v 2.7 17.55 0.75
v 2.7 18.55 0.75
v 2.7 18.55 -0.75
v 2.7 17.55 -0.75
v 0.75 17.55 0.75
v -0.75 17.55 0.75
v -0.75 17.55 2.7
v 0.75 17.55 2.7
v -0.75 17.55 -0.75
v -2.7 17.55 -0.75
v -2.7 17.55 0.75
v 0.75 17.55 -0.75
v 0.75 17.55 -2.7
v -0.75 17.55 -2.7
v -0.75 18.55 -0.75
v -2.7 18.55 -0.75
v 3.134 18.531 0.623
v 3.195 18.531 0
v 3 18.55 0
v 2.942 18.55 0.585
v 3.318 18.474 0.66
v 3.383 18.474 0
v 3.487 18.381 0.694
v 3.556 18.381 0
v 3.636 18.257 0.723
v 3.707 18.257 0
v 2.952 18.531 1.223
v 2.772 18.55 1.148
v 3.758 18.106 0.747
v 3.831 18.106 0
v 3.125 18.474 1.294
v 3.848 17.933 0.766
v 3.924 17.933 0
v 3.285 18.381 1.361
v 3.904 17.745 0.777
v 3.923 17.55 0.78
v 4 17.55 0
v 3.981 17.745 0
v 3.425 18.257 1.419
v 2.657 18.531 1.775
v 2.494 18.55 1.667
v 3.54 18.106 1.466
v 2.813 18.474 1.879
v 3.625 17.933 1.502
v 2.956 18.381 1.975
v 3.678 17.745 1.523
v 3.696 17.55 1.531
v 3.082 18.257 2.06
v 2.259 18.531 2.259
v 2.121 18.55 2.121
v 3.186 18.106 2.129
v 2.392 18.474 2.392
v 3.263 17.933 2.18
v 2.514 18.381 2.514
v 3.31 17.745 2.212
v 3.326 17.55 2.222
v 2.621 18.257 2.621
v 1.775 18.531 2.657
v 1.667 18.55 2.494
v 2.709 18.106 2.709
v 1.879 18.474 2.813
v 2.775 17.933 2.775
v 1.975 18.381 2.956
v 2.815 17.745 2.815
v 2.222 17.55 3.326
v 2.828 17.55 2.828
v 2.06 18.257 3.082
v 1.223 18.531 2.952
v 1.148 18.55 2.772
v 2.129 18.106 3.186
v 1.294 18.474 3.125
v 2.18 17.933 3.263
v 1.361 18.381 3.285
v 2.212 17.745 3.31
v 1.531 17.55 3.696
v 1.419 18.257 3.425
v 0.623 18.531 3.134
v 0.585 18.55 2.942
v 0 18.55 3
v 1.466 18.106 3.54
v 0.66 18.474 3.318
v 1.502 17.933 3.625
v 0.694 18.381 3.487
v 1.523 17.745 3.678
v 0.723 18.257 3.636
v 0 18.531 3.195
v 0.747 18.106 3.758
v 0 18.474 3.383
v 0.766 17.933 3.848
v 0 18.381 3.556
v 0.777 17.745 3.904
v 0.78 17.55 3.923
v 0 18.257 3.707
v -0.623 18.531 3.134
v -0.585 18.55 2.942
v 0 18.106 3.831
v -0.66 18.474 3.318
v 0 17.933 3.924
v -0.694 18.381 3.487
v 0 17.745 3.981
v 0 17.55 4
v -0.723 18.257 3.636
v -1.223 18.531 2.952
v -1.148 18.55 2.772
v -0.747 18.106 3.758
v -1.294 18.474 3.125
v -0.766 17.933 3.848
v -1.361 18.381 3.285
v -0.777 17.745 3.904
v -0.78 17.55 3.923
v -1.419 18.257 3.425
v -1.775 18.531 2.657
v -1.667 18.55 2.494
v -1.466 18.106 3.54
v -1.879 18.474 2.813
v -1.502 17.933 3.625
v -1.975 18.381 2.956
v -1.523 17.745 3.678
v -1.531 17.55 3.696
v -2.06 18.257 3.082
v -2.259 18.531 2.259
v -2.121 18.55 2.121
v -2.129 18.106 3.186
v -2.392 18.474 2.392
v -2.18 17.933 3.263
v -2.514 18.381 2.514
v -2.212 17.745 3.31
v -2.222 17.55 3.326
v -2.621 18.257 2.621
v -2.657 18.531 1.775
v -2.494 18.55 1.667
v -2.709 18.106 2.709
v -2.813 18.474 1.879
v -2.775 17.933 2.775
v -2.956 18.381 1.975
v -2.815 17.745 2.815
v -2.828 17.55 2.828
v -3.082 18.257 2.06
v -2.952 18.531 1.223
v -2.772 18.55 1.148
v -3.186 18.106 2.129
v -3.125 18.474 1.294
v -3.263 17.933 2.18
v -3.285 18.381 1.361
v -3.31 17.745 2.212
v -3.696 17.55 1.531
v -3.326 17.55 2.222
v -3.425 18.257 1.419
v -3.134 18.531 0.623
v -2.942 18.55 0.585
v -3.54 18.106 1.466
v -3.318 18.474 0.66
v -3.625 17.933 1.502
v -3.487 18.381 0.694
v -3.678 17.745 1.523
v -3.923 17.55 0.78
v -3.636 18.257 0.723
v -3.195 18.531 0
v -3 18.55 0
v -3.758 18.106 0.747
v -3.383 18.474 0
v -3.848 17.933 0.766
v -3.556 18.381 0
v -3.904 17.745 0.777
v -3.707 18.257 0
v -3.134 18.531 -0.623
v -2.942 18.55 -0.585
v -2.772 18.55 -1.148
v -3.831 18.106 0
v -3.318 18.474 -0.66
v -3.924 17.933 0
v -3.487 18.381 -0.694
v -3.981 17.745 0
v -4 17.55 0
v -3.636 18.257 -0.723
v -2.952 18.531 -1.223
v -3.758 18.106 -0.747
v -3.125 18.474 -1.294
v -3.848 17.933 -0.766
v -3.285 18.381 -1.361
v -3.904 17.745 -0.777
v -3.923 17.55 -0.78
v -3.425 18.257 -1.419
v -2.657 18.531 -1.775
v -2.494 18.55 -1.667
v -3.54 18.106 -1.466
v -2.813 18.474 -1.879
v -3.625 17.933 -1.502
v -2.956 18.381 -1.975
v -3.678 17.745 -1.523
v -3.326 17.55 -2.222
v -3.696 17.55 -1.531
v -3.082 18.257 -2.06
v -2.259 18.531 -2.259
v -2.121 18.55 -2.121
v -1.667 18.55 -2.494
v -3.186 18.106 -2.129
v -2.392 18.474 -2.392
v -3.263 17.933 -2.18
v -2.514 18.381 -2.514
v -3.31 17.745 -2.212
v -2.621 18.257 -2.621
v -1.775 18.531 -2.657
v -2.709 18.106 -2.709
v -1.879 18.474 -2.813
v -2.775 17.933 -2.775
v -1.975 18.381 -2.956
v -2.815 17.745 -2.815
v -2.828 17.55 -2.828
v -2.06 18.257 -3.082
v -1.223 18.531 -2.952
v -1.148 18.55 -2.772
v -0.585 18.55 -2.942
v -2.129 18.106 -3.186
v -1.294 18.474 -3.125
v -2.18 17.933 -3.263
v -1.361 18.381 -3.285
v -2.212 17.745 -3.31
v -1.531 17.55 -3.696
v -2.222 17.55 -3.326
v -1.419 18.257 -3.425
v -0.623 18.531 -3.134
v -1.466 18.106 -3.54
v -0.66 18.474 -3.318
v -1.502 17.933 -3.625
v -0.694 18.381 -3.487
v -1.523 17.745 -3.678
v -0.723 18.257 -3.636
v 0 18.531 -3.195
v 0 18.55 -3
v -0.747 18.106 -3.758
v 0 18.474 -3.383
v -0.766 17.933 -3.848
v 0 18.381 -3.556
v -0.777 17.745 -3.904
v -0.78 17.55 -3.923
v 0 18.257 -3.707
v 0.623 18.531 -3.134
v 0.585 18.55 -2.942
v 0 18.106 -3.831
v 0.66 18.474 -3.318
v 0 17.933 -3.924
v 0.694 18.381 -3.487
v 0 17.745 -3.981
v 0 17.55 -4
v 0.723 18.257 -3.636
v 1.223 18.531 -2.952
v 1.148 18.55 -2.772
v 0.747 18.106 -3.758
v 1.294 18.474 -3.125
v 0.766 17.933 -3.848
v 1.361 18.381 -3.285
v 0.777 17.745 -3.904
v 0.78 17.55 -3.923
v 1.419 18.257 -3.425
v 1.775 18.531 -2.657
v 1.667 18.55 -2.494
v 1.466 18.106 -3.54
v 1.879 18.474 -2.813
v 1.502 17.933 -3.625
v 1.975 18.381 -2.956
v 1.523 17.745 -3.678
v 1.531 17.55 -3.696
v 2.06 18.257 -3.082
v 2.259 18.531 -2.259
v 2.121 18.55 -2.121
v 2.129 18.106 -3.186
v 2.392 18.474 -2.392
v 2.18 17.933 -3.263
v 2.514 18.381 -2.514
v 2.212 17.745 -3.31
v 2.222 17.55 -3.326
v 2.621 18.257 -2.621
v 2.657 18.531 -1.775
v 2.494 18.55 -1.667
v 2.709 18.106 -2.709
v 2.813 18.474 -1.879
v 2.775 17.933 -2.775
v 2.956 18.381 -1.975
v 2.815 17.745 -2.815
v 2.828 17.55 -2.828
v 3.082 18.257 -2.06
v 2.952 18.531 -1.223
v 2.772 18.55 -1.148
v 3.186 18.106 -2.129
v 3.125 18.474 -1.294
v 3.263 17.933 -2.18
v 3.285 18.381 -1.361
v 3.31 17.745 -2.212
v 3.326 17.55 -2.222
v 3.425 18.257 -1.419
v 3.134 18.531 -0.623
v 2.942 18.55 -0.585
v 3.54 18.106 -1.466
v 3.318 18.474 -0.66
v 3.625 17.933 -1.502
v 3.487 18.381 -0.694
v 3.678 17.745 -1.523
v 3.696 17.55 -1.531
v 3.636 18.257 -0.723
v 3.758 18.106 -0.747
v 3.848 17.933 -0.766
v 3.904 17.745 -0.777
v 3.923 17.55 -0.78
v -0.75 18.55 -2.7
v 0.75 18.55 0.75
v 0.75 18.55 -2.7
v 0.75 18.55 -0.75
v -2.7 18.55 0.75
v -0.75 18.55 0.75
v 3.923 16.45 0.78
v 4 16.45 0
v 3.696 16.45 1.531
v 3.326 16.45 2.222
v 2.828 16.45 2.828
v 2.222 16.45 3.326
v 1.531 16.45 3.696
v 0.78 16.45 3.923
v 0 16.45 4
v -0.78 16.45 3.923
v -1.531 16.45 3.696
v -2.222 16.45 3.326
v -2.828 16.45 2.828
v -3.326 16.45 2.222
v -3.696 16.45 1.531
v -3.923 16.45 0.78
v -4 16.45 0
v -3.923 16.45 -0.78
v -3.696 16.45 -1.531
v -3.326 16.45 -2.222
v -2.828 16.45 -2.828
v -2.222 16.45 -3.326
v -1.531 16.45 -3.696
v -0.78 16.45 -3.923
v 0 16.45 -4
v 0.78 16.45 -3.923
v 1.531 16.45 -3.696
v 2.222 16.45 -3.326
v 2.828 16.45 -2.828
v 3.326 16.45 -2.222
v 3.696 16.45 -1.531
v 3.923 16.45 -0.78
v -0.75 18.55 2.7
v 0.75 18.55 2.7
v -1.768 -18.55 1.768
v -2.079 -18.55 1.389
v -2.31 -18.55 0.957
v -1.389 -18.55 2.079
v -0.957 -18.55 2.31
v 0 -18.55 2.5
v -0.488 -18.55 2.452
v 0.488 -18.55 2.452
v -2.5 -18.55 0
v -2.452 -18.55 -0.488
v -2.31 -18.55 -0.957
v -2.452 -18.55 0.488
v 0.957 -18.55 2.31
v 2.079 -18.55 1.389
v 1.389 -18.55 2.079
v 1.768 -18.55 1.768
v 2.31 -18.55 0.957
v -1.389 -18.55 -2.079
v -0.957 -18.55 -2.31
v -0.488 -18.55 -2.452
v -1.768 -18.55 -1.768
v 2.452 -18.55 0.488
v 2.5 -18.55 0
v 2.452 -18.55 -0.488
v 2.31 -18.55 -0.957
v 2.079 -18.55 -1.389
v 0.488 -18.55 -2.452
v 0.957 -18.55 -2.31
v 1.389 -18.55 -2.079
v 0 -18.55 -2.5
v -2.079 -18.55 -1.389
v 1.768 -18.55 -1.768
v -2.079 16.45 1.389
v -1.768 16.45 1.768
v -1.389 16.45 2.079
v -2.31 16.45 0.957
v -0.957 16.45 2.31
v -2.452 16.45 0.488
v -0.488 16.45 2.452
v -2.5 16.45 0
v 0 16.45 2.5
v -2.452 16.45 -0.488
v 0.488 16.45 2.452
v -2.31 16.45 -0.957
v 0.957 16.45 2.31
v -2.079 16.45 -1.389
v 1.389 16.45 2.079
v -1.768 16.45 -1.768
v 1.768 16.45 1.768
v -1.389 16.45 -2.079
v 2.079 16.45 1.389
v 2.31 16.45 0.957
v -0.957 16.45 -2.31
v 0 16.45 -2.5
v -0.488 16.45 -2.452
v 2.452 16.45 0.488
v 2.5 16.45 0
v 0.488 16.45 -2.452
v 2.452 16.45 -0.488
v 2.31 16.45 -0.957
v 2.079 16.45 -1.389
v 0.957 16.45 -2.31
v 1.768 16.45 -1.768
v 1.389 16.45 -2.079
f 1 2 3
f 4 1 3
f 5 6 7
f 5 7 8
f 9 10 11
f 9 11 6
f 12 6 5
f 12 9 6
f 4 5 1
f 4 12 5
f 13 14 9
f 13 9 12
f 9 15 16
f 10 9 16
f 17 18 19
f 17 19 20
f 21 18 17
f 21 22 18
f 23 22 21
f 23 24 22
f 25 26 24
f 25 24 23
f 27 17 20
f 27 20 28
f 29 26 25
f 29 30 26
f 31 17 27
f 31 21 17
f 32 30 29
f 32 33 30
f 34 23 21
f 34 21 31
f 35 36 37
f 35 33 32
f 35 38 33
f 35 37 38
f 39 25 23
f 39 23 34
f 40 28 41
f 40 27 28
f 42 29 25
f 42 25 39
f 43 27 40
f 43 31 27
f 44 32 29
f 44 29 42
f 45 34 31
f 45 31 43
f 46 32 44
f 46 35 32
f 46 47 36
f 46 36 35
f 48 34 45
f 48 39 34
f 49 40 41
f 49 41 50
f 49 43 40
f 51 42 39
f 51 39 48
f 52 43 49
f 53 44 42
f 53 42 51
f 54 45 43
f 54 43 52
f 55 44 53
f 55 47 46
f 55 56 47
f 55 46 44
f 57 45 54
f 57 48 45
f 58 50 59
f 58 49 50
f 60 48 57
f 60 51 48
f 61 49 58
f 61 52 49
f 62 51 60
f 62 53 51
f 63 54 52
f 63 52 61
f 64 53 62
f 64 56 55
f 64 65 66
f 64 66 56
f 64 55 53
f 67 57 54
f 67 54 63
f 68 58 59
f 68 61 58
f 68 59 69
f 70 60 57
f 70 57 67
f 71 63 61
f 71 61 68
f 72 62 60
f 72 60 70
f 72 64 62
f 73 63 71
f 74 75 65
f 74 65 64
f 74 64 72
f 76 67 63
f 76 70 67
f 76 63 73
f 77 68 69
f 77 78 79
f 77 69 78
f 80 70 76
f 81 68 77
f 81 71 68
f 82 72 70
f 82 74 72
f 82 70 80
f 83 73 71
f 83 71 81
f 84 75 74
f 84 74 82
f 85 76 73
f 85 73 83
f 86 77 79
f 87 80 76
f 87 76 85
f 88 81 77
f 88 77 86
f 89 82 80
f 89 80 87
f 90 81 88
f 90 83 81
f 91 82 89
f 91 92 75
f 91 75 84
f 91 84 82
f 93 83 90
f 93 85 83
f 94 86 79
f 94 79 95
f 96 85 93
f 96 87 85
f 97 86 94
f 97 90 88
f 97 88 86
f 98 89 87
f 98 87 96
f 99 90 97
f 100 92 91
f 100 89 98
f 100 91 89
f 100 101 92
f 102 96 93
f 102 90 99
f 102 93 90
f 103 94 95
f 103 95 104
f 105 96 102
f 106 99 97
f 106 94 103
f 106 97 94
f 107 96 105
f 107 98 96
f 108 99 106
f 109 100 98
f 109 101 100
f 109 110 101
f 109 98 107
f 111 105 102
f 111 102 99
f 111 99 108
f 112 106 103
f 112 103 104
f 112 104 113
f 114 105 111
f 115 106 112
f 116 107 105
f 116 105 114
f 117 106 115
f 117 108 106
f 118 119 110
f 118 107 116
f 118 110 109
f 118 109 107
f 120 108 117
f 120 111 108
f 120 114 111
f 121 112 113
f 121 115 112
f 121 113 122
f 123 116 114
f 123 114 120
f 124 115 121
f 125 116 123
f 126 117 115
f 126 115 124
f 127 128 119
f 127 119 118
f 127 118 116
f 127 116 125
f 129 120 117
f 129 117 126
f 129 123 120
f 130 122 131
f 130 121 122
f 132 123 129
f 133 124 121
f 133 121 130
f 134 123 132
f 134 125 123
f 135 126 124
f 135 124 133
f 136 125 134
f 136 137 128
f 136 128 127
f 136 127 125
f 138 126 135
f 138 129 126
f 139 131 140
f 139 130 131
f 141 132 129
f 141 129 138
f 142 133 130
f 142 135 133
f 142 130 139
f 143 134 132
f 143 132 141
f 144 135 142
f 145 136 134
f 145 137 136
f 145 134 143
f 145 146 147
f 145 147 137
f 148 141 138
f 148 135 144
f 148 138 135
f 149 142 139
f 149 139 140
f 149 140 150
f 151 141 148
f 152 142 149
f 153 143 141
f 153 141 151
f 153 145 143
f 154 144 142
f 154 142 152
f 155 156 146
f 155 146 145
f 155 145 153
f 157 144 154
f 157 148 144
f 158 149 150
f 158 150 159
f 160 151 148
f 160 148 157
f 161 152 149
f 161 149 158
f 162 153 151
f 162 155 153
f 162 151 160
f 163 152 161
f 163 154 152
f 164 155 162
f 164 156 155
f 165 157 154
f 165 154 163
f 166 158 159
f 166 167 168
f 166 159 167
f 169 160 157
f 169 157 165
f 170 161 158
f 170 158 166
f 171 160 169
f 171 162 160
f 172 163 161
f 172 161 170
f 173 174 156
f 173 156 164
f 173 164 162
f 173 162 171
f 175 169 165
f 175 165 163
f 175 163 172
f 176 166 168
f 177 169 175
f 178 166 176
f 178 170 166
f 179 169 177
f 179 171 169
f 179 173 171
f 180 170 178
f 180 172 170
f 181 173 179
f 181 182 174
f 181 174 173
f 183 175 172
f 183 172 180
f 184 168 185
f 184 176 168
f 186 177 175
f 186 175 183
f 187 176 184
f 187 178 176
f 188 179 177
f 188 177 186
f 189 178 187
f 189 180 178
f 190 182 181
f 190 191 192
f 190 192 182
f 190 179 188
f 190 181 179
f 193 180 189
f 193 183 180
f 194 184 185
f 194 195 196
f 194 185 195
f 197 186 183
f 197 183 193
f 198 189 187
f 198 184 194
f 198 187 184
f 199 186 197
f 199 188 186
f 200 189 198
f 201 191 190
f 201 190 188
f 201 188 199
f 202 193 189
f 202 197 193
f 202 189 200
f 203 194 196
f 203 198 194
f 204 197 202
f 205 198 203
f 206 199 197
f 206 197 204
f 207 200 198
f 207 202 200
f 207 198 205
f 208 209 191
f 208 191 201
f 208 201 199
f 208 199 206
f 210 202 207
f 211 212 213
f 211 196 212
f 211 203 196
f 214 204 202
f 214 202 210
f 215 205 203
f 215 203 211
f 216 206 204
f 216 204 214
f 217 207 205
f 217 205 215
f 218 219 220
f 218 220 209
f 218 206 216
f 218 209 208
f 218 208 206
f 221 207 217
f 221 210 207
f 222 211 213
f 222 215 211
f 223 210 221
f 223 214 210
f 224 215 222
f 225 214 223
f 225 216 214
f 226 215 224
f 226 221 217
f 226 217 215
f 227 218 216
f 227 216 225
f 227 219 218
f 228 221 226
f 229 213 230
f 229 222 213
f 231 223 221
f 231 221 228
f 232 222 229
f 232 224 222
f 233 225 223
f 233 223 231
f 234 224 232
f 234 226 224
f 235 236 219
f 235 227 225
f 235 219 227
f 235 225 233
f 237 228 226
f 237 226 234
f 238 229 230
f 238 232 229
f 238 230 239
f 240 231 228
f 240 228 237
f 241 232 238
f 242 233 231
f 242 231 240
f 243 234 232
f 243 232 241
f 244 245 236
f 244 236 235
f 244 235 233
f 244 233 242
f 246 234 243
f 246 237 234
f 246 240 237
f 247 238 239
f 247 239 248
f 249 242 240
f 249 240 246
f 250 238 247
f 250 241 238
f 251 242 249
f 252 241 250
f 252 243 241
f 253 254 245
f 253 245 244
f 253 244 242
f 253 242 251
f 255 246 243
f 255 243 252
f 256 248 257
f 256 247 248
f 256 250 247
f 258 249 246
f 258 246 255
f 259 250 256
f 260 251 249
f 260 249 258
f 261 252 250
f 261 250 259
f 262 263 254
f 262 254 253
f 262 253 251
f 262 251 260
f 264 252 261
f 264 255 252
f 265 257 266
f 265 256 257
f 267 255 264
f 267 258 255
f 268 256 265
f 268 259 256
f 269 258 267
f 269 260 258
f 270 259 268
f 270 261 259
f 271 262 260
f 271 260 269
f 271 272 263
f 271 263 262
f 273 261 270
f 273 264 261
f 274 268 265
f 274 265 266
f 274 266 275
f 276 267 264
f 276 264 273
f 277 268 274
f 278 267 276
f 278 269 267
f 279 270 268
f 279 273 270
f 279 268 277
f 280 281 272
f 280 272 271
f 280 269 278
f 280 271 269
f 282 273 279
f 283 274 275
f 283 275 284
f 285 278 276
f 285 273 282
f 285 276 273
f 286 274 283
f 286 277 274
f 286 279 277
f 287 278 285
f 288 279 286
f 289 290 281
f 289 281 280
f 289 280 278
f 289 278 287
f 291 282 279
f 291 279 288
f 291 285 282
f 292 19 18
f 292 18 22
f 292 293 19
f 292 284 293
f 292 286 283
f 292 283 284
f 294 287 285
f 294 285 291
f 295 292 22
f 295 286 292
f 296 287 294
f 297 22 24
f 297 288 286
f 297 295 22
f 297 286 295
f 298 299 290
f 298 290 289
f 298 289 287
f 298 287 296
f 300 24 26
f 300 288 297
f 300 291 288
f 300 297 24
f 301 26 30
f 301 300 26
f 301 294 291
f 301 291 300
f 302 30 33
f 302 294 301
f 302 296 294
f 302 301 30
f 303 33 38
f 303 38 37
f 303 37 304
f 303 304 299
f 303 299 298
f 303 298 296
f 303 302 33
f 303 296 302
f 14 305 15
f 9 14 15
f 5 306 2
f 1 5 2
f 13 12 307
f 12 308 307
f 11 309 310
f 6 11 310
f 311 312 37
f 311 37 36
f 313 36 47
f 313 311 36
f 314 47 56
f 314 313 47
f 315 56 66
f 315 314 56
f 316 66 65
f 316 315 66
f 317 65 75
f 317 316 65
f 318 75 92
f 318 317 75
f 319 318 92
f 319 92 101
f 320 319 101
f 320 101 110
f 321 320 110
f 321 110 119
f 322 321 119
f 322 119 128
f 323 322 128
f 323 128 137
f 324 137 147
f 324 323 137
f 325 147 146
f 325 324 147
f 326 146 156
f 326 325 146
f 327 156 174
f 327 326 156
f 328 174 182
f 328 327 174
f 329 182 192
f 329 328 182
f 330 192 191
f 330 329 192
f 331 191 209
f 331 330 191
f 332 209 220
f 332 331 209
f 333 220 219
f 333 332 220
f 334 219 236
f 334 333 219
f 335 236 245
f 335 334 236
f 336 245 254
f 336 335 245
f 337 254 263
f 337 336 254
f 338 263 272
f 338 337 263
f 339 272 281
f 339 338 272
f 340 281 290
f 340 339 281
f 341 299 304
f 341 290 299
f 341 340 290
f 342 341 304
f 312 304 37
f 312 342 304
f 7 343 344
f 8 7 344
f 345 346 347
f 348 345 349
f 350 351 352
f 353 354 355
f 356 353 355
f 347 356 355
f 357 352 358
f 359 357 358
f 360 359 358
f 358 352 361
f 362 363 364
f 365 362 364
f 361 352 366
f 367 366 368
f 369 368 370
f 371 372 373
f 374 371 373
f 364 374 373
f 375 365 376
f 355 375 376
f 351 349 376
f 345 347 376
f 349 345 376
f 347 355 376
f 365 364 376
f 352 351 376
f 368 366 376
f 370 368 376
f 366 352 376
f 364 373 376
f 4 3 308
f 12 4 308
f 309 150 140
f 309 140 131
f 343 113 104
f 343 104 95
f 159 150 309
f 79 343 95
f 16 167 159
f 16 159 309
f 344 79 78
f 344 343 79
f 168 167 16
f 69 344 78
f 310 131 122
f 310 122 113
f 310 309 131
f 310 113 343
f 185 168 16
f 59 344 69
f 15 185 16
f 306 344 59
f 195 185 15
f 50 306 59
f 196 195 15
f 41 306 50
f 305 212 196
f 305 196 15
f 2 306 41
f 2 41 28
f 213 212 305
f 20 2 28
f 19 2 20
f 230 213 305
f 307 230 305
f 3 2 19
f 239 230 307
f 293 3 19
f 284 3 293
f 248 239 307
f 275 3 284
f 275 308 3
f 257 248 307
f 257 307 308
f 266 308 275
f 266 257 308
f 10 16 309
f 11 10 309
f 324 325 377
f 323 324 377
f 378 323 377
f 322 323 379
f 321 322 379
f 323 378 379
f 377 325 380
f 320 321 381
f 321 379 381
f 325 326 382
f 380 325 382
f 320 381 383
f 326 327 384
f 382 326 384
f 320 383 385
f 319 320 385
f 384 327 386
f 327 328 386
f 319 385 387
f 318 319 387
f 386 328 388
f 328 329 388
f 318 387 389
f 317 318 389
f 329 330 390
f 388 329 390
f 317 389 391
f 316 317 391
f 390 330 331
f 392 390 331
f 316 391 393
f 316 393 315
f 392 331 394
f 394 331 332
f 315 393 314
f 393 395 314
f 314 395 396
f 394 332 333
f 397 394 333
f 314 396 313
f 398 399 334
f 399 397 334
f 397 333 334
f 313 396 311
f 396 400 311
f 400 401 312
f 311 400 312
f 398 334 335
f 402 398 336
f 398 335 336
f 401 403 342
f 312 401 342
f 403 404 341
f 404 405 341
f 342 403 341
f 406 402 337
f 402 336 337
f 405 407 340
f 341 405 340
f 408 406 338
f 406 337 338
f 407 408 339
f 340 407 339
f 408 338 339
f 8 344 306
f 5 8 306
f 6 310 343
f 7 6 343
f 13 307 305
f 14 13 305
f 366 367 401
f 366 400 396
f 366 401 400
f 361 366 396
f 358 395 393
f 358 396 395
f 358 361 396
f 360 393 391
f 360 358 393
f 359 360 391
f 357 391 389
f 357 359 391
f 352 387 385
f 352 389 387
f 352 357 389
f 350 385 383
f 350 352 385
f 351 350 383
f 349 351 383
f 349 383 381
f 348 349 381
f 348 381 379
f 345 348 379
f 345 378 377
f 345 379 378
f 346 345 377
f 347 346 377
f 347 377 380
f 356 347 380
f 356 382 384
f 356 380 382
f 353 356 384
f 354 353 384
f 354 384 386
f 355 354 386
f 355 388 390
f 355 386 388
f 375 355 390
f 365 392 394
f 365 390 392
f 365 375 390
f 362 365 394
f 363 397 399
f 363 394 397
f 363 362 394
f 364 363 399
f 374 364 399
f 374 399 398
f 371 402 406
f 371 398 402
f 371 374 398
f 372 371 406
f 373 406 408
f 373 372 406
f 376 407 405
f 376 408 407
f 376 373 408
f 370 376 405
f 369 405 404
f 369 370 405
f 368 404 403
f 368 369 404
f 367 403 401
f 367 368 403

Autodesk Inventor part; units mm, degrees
ref_plane "YZ Plane" through (0, 0, 0) normal (1, 0, 0) x (0, 1, 0)
ref_plane "XZ Plane" through (0, 0, 0) normal (0, 1, 0) x (-1, 0, 0)
ref_plane "XY Plane" through (0, 0, 0) normal (0, 0, 1) x (1, 0, 0)
sketch "Sketch1" plane through (0, 0, 0) normal (0, 0, 1) x (1, 0, 0)
  line L0 (2.5, 16.45) -> (2.5, -18.55)
  line L1 (2.5, -18.55) -> (0, -18.55)
  line L2 (0, -18.55) -> (0, 18.55)
  line L3 (0, 18.55) -> (4, 18.55)
  line L4 (4, 18.55) -> (4, 16.45)
  line L5 (4, 16.45) -> (2.5, 16.45)
  point P0 (0, 0)
  point P1 (0, 0)
  dimension "d0" = 2.5
  dimension "d1" = 35
  dimension "d2" = 2.1
  dimension "d3" = 4
revolve "Revolution1" add sketch "Sketch1" angle 360 about axis through (0, -18.55, 0) along (0, 1, 0)
fillet "Fillet1" radius 1 1 edges at (-4, 18.55, 0)
sketch "Sketch2" plane through (0, 18.55, 0) normal (0, 1, 0) x (1, 0, 0)
  line L0 (-2.7, 0) -> (-2.7, -0.75)
  line L1 (-2.7, -0.75) -> (-0.75, -0.75)
  line L2 (-0.75, -0.75) -> (-0.75, -2.7)
  line L3 (-0.75, -2.7) -> (0, -2.7)
  line L4 (2.7, -0.75) -> (2.7, 0)
  line L5 (0.75, -2.7) -> (0.75, -0.75)
  line L6 (0, -2.7) -> (0.75, -2.7)
  line L7 (0.75, -0.75) -> (2.7, -0.75)
  line L8 (0.75, 2.7) -> (0, 2.7)
  line L9 (2.7, 0.75) -> (0.75, 0.75)
  line L10 (2.7, 0) -> (2.7, 0.75)
  line L11 (0.75, 0.75) -> (0.75, 2.7)
  line L12 (-2.7, 0.75) -> (-2.7, 0)
  line L13 (-0.75, 2.7) -> (-0.75, 0.75)
  line L14 (0, 2.7) -> (-0.75, 2.7)
  line L15 (-0.75, 0.75) -> (-2.7, 0.75)
  line L16 (-0.75, -2.7) -> (0.75, -2.7)
  line L17 (2.7, -0.75) -> (2.7, 0.75)
  line L18 (-0.75, 2.7) -> (0.75, 2.7)
  line L19 (-2.7, -0.75) -> (-2.7, 0.75)
  point P0 (0, 0)
  dimension "d6" = 0.75
  dimension "d7" = 0.75
  dimension "d8" = 2.7
  dimension "d9" = 2.7
  dimension "d12" = 360
extrude "Extrusion1" cut sketch "Sketch2" against normal blind 1
thread "Thread1" size "M5x0.8" class "6g" standard "ANSI Metric M Profile" full length
equation "\"d9\" = d8"
properties part number "M5x35mm-crosshead"
